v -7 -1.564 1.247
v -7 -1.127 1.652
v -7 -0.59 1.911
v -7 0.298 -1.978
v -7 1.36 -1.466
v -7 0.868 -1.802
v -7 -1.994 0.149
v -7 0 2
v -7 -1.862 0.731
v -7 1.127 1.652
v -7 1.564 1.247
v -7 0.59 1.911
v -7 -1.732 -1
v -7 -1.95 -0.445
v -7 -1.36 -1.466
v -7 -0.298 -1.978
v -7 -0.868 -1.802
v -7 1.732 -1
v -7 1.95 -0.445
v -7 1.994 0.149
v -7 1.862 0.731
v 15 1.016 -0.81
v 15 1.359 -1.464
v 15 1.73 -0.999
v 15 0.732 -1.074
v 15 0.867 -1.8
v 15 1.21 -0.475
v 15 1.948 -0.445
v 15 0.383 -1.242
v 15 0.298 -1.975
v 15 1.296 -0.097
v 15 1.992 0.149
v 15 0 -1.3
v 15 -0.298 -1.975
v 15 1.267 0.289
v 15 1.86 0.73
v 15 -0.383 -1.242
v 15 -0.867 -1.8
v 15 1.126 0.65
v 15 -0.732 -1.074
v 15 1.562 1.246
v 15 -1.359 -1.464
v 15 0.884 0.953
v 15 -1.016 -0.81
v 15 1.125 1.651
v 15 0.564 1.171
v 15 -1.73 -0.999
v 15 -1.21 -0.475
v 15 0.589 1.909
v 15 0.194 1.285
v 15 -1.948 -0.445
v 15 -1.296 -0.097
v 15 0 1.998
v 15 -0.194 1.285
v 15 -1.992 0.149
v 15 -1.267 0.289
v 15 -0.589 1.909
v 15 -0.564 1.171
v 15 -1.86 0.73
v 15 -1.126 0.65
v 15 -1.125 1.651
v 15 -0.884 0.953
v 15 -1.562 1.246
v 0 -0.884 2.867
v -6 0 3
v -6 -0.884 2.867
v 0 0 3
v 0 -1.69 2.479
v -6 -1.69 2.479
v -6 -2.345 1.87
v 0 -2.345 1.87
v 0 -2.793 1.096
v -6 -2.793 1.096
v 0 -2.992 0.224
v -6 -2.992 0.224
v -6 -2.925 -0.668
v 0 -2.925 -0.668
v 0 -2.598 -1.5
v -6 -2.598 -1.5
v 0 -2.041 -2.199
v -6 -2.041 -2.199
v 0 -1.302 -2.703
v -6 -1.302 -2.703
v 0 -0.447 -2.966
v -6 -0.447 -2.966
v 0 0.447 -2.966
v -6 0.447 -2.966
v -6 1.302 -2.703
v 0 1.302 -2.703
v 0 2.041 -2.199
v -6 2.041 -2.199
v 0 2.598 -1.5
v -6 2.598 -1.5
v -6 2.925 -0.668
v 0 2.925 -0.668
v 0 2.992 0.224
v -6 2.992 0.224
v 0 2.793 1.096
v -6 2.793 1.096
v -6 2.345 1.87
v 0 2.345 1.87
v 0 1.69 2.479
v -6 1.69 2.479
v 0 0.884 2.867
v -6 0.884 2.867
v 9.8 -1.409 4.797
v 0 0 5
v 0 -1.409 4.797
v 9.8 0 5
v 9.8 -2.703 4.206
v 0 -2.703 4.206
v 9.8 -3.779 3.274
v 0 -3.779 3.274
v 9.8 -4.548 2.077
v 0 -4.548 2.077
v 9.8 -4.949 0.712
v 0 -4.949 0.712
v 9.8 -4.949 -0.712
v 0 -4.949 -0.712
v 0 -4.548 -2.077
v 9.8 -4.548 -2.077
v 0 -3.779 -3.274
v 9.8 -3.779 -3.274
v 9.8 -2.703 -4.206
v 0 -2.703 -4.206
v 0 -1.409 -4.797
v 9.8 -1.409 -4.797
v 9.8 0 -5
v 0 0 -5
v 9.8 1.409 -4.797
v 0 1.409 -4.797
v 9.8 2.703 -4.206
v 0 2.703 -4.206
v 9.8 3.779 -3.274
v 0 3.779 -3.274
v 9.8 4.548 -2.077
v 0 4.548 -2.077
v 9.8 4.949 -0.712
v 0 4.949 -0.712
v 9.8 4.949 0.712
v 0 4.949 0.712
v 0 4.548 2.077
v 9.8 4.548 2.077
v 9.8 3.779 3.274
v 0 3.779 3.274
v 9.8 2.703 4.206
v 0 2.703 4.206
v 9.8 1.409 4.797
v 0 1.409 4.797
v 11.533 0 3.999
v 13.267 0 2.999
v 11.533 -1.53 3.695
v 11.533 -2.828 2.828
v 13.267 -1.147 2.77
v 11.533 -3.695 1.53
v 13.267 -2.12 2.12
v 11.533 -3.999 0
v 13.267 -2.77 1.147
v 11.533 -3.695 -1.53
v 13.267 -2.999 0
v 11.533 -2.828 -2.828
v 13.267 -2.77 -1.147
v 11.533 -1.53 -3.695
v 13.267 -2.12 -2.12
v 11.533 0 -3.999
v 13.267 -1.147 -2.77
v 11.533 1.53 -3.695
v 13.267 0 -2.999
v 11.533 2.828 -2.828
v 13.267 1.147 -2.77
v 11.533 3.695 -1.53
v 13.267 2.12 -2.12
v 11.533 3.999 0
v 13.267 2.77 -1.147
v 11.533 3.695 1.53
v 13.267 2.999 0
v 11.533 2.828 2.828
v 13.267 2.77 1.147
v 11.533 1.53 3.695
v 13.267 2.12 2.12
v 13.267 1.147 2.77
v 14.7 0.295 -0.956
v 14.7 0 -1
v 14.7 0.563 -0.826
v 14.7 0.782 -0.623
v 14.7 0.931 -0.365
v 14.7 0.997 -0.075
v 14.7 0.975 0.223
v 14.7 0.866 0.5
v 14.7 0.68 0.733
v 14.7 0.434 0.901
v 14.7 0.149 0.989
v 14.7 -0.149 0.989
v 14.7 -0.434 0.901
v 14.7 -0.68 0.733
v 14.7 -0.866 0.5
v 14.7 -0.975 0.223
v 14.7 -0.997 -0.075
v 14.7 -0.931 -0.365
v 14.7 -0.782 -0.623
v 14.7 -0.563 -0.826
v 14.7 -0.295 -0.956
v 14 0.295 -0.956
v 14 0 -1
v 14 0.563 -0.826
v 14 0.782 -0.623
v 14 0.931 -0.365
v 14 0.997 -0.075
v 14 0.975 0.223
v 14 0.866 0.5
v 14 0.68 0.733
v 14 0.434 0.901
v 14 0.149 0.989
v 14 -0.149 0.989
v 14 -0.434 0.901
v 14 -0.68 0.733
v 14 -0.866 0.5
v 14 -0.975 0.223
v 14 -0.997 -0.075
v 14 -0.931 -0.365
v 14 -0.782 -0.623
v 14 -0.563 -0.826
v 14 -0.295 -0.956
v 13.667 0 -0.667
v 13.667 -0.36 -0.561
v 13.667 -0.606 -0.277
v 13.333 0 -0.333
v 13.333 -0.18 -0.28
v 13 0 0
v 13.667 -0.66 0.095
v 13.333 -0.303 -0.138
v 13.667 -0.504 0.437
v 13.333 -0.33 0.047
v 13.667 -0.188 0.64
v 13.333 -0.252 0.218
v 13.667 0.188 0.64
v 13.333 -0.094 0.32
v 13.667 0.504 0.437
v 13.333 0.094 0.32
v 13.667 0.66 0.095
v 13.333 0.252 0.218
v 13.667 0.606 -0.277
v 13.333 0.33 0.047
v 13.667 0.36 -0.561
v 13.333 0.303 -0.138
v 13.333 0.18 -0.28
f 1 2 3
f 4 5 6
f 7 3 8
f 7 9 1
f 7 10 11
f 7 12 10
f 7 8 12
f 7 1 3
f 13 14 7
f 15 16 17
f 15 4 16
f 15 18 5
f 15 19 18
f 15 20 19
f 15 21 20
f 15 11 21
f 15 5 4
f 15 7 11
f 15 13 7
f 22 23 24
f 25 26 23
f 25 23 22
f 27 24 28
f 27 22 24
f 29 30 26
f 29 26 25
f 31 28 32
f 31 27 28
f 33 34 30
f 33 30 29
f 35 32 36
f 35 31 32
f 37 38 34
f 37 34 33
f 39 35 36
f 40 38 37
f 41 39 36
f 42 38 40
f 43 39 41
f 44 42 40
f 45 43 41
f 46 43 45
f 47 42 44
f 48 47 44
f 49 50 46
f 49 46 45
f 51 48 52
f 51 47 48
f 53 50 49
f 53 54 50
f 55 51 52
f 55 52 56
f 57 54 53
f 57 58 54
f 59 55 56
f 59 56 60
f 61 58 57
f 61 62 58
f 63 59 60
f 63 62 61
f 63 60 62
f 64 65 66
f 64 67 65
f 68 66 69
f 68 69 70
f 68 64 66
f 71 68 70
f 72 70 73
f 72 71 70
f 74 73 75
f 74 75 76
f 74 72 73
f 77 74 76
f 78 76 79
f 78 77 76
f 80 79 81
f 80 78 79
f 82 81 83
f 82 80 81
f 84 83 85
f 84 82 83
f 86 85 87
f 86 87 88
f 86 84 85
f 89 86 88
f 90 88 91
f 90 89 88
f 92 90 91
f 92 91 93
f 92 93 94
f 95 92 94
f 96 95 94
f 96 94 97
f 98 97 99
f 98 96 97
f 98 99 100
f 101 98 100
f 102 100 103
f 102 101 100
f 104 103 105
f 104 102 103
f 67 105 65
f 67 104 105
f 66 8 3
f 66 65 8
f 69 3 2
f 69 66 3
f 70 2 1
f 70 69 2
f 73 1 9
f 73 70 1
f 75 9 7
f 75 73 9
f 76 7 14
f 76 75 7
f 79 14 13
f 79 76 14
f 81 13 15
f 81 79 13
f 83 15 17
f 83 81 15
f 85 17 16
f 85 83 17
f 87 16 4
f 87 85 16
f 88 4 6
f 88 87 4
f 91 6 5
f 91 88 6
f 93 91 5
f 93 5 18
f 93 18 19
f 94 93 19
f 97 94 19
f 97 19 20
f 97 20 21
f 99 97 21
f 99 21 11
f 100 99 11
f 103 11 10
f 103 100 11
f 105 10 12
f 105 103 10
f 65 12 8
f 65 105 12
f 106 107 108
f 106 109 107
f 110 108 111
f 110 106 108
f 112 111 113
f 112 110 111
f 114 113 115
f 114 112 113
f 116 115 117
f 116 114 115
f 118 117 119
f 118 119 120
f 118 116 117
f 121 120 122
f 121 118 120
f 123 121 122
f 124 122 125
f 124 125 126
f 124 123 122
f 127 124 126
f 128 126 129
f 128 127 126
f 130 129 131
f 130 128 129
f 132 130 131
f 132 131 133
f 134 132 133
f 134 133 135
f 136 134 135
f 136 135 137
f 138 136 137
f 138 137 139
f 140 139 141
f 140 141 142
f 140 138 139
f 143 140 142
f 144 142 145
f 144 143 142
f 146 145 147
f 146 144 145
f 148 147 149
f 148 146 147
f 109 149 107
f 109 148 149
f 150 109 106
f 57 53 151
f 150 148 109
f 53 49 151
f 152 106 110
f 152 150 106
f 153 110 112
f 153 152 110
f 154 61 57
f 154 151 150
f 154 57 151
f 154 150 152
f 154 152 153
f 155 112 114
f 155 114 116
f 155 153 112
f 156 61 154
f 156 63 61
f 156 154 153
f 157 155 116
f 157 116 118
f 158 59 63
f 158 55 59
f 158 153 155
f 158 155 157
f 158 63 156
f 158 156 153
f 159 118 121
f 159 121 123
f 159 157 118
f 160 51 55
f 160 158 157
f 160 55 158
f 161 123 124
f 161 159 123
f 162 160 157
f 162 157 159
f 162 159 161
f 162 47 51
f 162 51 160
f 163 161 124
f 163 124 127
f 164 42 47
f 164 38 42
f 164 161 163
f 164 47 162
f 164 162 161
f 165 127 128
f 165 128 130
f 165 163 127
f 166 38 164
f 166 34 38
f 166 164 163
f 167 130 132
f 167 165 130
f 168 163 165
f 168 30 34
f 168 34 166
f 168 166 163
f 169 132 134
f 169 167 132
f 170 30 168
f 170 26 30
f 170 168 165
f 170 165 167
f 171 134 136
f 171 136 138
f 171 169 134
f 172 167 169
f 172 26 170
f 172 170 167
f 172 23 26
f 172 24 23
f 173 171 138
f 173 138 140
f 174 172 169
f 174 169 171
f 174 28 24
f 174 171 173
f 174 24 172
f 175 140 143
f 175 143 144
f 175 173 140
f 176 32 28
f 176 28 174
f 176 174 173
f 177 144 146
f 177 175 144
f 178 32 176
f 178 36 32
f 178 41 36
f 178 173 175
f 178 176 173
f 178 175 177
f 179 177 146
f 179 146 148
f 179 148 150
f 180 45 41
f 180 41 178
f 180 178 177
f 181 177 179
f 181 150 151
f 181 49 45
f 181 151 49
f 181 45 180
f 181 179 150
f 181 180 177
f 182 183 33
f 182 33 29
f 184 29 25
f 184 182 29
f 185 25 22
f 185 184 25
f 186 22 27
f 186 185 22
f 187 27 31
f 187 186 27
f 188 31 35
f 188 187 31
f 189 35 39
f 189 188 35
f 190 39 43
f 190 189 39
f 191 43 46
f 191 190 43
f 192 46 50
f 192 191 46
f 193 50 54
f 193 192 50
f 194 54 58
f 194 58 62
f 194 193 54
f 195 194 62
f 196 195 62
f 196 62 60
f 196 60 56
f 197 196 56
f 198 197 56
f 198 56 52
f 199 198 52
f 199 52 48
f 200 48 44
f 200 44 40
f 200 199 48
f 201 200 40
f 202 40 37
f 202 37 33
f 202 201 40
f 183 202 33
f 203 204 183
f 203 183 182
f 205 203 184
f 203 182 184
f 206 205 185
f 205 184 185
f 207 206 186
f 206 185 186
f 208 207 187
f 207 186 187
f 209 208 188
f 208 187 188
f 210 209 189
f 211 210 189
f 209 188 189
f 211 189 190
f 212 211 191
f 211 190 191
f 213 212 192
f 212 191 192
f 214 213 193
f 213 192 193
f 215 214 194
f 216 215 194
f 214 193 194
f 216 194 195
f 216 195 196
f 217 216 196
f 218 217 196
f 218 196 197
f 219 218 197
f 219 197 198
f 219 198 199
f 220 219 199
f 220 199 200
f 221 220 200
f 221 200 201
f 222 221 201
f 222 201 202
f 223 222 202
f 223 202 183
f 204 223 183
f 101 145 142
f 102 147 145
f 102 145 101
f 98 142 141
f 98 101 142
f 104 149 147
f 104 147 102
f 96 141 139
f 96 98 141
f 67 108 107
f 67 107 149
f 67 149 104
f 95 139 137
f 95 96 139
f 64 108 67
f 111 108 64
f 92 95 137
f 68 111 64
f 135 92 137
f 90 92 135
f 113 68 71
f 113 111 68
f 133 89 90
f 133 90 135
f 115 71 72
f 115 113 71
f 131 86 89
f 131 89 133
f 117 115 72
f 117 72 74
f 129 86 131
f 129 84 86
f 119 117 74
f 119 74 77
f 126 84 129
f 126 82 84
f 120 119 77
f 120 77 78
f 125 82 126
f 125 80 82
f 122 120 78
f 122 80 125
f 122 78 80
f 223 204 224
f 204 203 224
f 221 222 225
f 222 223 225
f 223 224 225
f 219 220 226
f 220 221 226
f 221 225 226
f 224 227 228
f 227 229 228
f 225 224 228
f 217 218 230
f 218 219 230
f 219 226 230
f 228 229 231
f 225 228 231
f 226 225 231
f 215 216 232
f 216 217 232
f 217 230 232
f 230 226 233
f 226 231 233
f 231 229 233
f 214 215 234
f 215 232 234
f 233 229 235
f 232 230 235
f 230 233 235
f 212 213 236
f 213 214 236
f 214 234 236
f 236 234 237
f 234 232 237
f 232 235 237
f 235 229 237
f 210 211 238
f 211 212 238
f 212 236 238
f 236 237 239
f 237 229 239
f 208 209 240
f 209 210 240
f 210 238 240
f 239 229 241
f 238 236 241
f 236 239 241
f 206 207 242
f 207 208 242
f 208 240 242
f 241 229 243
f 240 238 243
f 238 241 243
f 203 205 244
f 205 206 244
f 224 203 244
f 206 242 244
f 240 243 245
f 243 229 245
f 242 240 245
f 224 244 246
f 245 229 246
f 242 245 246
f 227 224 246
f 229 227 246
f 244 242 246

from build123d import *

# Parameters (mm, degrees)
SKETCH2_R          = 1
CUT_EXTRUDE1_DEPTH = 0.3
CHAMFER1_SIZE      = 0.3
SKETCH3_R          = 1
CUT_EXTRUDE2_DEPTH = 0.7


with BuildPart() as part:
    # Sketch1 → Revolve1 (revolve)
    with BuildSketch(Plane(origin=(0, 0, 0), x_dir=(1, 0, 0), z_dir=(0, 1, 0)), mode=Mode.PRIVATE) as revolve1_sk:
        Polygon((-7, 0), (-7, 2), (-6, 3), (0, 3), (0, 5), (9.8, 5), (15, 1.9977786), (15, 0), align=None)
    revolve(revolve1_sk.sketch.rotate(Axis((-2.845265589, 0, 0), (1, 0, 0)), 180), axis=Axis((-2.845265589, 0, 0), (1, 0, 0)))

    # Sketch2 → Cut-Extrude1 (cut)
    with BuildSketch(Plane(origin=(15, 0, 0), x_dir=(0, 0, -1), z_dir=(1, 0, 0))):
        Circle(SKETCH2_R)
    extrude(amount=-CUT_EXTRUDE1_DEPTH, mode=Mode.SUBTRACT)

    # Chamfer1
    chamfer1_edges = [part.edges().sort_by_distance(p)[0] for p in [
        (15, 0, 1),
    ]]
    chamfer(chamfer1_edges, length=CHAMFER1_SIZE - 0.0001)  # a hair under: the kernel refuses the full size

    # Sketch3 → Cut-Extrude2 (cut)
    with BuildSketch(Plane(origin=(14.7, 0, 0), x_dir=(0, 0, -1), z_dir=(1, 0, 0))):
        Circle(SKETCH3_R)
    extrude(amount=-CUT_EXTRUDE2_DEPTH, mode=Mode.SUBTRACT)

    # Cut-Extrude3 cone 1 section (through the dimple's axis) → Cut-Extrude3 (revolve, cut)
    with BuildSketch(Plane(origin=(14, 0, 0), x_dir=(0, 0, -1), z_dir=(0, 1, 0))):
        Polygon((0, 0), (1, 0), (0, 1), align=None)
    revolve(axis=Axis((14, 0, 0), (-1, 0, 0)), mode=Mode.SUBTRACT)


solid = part.part
